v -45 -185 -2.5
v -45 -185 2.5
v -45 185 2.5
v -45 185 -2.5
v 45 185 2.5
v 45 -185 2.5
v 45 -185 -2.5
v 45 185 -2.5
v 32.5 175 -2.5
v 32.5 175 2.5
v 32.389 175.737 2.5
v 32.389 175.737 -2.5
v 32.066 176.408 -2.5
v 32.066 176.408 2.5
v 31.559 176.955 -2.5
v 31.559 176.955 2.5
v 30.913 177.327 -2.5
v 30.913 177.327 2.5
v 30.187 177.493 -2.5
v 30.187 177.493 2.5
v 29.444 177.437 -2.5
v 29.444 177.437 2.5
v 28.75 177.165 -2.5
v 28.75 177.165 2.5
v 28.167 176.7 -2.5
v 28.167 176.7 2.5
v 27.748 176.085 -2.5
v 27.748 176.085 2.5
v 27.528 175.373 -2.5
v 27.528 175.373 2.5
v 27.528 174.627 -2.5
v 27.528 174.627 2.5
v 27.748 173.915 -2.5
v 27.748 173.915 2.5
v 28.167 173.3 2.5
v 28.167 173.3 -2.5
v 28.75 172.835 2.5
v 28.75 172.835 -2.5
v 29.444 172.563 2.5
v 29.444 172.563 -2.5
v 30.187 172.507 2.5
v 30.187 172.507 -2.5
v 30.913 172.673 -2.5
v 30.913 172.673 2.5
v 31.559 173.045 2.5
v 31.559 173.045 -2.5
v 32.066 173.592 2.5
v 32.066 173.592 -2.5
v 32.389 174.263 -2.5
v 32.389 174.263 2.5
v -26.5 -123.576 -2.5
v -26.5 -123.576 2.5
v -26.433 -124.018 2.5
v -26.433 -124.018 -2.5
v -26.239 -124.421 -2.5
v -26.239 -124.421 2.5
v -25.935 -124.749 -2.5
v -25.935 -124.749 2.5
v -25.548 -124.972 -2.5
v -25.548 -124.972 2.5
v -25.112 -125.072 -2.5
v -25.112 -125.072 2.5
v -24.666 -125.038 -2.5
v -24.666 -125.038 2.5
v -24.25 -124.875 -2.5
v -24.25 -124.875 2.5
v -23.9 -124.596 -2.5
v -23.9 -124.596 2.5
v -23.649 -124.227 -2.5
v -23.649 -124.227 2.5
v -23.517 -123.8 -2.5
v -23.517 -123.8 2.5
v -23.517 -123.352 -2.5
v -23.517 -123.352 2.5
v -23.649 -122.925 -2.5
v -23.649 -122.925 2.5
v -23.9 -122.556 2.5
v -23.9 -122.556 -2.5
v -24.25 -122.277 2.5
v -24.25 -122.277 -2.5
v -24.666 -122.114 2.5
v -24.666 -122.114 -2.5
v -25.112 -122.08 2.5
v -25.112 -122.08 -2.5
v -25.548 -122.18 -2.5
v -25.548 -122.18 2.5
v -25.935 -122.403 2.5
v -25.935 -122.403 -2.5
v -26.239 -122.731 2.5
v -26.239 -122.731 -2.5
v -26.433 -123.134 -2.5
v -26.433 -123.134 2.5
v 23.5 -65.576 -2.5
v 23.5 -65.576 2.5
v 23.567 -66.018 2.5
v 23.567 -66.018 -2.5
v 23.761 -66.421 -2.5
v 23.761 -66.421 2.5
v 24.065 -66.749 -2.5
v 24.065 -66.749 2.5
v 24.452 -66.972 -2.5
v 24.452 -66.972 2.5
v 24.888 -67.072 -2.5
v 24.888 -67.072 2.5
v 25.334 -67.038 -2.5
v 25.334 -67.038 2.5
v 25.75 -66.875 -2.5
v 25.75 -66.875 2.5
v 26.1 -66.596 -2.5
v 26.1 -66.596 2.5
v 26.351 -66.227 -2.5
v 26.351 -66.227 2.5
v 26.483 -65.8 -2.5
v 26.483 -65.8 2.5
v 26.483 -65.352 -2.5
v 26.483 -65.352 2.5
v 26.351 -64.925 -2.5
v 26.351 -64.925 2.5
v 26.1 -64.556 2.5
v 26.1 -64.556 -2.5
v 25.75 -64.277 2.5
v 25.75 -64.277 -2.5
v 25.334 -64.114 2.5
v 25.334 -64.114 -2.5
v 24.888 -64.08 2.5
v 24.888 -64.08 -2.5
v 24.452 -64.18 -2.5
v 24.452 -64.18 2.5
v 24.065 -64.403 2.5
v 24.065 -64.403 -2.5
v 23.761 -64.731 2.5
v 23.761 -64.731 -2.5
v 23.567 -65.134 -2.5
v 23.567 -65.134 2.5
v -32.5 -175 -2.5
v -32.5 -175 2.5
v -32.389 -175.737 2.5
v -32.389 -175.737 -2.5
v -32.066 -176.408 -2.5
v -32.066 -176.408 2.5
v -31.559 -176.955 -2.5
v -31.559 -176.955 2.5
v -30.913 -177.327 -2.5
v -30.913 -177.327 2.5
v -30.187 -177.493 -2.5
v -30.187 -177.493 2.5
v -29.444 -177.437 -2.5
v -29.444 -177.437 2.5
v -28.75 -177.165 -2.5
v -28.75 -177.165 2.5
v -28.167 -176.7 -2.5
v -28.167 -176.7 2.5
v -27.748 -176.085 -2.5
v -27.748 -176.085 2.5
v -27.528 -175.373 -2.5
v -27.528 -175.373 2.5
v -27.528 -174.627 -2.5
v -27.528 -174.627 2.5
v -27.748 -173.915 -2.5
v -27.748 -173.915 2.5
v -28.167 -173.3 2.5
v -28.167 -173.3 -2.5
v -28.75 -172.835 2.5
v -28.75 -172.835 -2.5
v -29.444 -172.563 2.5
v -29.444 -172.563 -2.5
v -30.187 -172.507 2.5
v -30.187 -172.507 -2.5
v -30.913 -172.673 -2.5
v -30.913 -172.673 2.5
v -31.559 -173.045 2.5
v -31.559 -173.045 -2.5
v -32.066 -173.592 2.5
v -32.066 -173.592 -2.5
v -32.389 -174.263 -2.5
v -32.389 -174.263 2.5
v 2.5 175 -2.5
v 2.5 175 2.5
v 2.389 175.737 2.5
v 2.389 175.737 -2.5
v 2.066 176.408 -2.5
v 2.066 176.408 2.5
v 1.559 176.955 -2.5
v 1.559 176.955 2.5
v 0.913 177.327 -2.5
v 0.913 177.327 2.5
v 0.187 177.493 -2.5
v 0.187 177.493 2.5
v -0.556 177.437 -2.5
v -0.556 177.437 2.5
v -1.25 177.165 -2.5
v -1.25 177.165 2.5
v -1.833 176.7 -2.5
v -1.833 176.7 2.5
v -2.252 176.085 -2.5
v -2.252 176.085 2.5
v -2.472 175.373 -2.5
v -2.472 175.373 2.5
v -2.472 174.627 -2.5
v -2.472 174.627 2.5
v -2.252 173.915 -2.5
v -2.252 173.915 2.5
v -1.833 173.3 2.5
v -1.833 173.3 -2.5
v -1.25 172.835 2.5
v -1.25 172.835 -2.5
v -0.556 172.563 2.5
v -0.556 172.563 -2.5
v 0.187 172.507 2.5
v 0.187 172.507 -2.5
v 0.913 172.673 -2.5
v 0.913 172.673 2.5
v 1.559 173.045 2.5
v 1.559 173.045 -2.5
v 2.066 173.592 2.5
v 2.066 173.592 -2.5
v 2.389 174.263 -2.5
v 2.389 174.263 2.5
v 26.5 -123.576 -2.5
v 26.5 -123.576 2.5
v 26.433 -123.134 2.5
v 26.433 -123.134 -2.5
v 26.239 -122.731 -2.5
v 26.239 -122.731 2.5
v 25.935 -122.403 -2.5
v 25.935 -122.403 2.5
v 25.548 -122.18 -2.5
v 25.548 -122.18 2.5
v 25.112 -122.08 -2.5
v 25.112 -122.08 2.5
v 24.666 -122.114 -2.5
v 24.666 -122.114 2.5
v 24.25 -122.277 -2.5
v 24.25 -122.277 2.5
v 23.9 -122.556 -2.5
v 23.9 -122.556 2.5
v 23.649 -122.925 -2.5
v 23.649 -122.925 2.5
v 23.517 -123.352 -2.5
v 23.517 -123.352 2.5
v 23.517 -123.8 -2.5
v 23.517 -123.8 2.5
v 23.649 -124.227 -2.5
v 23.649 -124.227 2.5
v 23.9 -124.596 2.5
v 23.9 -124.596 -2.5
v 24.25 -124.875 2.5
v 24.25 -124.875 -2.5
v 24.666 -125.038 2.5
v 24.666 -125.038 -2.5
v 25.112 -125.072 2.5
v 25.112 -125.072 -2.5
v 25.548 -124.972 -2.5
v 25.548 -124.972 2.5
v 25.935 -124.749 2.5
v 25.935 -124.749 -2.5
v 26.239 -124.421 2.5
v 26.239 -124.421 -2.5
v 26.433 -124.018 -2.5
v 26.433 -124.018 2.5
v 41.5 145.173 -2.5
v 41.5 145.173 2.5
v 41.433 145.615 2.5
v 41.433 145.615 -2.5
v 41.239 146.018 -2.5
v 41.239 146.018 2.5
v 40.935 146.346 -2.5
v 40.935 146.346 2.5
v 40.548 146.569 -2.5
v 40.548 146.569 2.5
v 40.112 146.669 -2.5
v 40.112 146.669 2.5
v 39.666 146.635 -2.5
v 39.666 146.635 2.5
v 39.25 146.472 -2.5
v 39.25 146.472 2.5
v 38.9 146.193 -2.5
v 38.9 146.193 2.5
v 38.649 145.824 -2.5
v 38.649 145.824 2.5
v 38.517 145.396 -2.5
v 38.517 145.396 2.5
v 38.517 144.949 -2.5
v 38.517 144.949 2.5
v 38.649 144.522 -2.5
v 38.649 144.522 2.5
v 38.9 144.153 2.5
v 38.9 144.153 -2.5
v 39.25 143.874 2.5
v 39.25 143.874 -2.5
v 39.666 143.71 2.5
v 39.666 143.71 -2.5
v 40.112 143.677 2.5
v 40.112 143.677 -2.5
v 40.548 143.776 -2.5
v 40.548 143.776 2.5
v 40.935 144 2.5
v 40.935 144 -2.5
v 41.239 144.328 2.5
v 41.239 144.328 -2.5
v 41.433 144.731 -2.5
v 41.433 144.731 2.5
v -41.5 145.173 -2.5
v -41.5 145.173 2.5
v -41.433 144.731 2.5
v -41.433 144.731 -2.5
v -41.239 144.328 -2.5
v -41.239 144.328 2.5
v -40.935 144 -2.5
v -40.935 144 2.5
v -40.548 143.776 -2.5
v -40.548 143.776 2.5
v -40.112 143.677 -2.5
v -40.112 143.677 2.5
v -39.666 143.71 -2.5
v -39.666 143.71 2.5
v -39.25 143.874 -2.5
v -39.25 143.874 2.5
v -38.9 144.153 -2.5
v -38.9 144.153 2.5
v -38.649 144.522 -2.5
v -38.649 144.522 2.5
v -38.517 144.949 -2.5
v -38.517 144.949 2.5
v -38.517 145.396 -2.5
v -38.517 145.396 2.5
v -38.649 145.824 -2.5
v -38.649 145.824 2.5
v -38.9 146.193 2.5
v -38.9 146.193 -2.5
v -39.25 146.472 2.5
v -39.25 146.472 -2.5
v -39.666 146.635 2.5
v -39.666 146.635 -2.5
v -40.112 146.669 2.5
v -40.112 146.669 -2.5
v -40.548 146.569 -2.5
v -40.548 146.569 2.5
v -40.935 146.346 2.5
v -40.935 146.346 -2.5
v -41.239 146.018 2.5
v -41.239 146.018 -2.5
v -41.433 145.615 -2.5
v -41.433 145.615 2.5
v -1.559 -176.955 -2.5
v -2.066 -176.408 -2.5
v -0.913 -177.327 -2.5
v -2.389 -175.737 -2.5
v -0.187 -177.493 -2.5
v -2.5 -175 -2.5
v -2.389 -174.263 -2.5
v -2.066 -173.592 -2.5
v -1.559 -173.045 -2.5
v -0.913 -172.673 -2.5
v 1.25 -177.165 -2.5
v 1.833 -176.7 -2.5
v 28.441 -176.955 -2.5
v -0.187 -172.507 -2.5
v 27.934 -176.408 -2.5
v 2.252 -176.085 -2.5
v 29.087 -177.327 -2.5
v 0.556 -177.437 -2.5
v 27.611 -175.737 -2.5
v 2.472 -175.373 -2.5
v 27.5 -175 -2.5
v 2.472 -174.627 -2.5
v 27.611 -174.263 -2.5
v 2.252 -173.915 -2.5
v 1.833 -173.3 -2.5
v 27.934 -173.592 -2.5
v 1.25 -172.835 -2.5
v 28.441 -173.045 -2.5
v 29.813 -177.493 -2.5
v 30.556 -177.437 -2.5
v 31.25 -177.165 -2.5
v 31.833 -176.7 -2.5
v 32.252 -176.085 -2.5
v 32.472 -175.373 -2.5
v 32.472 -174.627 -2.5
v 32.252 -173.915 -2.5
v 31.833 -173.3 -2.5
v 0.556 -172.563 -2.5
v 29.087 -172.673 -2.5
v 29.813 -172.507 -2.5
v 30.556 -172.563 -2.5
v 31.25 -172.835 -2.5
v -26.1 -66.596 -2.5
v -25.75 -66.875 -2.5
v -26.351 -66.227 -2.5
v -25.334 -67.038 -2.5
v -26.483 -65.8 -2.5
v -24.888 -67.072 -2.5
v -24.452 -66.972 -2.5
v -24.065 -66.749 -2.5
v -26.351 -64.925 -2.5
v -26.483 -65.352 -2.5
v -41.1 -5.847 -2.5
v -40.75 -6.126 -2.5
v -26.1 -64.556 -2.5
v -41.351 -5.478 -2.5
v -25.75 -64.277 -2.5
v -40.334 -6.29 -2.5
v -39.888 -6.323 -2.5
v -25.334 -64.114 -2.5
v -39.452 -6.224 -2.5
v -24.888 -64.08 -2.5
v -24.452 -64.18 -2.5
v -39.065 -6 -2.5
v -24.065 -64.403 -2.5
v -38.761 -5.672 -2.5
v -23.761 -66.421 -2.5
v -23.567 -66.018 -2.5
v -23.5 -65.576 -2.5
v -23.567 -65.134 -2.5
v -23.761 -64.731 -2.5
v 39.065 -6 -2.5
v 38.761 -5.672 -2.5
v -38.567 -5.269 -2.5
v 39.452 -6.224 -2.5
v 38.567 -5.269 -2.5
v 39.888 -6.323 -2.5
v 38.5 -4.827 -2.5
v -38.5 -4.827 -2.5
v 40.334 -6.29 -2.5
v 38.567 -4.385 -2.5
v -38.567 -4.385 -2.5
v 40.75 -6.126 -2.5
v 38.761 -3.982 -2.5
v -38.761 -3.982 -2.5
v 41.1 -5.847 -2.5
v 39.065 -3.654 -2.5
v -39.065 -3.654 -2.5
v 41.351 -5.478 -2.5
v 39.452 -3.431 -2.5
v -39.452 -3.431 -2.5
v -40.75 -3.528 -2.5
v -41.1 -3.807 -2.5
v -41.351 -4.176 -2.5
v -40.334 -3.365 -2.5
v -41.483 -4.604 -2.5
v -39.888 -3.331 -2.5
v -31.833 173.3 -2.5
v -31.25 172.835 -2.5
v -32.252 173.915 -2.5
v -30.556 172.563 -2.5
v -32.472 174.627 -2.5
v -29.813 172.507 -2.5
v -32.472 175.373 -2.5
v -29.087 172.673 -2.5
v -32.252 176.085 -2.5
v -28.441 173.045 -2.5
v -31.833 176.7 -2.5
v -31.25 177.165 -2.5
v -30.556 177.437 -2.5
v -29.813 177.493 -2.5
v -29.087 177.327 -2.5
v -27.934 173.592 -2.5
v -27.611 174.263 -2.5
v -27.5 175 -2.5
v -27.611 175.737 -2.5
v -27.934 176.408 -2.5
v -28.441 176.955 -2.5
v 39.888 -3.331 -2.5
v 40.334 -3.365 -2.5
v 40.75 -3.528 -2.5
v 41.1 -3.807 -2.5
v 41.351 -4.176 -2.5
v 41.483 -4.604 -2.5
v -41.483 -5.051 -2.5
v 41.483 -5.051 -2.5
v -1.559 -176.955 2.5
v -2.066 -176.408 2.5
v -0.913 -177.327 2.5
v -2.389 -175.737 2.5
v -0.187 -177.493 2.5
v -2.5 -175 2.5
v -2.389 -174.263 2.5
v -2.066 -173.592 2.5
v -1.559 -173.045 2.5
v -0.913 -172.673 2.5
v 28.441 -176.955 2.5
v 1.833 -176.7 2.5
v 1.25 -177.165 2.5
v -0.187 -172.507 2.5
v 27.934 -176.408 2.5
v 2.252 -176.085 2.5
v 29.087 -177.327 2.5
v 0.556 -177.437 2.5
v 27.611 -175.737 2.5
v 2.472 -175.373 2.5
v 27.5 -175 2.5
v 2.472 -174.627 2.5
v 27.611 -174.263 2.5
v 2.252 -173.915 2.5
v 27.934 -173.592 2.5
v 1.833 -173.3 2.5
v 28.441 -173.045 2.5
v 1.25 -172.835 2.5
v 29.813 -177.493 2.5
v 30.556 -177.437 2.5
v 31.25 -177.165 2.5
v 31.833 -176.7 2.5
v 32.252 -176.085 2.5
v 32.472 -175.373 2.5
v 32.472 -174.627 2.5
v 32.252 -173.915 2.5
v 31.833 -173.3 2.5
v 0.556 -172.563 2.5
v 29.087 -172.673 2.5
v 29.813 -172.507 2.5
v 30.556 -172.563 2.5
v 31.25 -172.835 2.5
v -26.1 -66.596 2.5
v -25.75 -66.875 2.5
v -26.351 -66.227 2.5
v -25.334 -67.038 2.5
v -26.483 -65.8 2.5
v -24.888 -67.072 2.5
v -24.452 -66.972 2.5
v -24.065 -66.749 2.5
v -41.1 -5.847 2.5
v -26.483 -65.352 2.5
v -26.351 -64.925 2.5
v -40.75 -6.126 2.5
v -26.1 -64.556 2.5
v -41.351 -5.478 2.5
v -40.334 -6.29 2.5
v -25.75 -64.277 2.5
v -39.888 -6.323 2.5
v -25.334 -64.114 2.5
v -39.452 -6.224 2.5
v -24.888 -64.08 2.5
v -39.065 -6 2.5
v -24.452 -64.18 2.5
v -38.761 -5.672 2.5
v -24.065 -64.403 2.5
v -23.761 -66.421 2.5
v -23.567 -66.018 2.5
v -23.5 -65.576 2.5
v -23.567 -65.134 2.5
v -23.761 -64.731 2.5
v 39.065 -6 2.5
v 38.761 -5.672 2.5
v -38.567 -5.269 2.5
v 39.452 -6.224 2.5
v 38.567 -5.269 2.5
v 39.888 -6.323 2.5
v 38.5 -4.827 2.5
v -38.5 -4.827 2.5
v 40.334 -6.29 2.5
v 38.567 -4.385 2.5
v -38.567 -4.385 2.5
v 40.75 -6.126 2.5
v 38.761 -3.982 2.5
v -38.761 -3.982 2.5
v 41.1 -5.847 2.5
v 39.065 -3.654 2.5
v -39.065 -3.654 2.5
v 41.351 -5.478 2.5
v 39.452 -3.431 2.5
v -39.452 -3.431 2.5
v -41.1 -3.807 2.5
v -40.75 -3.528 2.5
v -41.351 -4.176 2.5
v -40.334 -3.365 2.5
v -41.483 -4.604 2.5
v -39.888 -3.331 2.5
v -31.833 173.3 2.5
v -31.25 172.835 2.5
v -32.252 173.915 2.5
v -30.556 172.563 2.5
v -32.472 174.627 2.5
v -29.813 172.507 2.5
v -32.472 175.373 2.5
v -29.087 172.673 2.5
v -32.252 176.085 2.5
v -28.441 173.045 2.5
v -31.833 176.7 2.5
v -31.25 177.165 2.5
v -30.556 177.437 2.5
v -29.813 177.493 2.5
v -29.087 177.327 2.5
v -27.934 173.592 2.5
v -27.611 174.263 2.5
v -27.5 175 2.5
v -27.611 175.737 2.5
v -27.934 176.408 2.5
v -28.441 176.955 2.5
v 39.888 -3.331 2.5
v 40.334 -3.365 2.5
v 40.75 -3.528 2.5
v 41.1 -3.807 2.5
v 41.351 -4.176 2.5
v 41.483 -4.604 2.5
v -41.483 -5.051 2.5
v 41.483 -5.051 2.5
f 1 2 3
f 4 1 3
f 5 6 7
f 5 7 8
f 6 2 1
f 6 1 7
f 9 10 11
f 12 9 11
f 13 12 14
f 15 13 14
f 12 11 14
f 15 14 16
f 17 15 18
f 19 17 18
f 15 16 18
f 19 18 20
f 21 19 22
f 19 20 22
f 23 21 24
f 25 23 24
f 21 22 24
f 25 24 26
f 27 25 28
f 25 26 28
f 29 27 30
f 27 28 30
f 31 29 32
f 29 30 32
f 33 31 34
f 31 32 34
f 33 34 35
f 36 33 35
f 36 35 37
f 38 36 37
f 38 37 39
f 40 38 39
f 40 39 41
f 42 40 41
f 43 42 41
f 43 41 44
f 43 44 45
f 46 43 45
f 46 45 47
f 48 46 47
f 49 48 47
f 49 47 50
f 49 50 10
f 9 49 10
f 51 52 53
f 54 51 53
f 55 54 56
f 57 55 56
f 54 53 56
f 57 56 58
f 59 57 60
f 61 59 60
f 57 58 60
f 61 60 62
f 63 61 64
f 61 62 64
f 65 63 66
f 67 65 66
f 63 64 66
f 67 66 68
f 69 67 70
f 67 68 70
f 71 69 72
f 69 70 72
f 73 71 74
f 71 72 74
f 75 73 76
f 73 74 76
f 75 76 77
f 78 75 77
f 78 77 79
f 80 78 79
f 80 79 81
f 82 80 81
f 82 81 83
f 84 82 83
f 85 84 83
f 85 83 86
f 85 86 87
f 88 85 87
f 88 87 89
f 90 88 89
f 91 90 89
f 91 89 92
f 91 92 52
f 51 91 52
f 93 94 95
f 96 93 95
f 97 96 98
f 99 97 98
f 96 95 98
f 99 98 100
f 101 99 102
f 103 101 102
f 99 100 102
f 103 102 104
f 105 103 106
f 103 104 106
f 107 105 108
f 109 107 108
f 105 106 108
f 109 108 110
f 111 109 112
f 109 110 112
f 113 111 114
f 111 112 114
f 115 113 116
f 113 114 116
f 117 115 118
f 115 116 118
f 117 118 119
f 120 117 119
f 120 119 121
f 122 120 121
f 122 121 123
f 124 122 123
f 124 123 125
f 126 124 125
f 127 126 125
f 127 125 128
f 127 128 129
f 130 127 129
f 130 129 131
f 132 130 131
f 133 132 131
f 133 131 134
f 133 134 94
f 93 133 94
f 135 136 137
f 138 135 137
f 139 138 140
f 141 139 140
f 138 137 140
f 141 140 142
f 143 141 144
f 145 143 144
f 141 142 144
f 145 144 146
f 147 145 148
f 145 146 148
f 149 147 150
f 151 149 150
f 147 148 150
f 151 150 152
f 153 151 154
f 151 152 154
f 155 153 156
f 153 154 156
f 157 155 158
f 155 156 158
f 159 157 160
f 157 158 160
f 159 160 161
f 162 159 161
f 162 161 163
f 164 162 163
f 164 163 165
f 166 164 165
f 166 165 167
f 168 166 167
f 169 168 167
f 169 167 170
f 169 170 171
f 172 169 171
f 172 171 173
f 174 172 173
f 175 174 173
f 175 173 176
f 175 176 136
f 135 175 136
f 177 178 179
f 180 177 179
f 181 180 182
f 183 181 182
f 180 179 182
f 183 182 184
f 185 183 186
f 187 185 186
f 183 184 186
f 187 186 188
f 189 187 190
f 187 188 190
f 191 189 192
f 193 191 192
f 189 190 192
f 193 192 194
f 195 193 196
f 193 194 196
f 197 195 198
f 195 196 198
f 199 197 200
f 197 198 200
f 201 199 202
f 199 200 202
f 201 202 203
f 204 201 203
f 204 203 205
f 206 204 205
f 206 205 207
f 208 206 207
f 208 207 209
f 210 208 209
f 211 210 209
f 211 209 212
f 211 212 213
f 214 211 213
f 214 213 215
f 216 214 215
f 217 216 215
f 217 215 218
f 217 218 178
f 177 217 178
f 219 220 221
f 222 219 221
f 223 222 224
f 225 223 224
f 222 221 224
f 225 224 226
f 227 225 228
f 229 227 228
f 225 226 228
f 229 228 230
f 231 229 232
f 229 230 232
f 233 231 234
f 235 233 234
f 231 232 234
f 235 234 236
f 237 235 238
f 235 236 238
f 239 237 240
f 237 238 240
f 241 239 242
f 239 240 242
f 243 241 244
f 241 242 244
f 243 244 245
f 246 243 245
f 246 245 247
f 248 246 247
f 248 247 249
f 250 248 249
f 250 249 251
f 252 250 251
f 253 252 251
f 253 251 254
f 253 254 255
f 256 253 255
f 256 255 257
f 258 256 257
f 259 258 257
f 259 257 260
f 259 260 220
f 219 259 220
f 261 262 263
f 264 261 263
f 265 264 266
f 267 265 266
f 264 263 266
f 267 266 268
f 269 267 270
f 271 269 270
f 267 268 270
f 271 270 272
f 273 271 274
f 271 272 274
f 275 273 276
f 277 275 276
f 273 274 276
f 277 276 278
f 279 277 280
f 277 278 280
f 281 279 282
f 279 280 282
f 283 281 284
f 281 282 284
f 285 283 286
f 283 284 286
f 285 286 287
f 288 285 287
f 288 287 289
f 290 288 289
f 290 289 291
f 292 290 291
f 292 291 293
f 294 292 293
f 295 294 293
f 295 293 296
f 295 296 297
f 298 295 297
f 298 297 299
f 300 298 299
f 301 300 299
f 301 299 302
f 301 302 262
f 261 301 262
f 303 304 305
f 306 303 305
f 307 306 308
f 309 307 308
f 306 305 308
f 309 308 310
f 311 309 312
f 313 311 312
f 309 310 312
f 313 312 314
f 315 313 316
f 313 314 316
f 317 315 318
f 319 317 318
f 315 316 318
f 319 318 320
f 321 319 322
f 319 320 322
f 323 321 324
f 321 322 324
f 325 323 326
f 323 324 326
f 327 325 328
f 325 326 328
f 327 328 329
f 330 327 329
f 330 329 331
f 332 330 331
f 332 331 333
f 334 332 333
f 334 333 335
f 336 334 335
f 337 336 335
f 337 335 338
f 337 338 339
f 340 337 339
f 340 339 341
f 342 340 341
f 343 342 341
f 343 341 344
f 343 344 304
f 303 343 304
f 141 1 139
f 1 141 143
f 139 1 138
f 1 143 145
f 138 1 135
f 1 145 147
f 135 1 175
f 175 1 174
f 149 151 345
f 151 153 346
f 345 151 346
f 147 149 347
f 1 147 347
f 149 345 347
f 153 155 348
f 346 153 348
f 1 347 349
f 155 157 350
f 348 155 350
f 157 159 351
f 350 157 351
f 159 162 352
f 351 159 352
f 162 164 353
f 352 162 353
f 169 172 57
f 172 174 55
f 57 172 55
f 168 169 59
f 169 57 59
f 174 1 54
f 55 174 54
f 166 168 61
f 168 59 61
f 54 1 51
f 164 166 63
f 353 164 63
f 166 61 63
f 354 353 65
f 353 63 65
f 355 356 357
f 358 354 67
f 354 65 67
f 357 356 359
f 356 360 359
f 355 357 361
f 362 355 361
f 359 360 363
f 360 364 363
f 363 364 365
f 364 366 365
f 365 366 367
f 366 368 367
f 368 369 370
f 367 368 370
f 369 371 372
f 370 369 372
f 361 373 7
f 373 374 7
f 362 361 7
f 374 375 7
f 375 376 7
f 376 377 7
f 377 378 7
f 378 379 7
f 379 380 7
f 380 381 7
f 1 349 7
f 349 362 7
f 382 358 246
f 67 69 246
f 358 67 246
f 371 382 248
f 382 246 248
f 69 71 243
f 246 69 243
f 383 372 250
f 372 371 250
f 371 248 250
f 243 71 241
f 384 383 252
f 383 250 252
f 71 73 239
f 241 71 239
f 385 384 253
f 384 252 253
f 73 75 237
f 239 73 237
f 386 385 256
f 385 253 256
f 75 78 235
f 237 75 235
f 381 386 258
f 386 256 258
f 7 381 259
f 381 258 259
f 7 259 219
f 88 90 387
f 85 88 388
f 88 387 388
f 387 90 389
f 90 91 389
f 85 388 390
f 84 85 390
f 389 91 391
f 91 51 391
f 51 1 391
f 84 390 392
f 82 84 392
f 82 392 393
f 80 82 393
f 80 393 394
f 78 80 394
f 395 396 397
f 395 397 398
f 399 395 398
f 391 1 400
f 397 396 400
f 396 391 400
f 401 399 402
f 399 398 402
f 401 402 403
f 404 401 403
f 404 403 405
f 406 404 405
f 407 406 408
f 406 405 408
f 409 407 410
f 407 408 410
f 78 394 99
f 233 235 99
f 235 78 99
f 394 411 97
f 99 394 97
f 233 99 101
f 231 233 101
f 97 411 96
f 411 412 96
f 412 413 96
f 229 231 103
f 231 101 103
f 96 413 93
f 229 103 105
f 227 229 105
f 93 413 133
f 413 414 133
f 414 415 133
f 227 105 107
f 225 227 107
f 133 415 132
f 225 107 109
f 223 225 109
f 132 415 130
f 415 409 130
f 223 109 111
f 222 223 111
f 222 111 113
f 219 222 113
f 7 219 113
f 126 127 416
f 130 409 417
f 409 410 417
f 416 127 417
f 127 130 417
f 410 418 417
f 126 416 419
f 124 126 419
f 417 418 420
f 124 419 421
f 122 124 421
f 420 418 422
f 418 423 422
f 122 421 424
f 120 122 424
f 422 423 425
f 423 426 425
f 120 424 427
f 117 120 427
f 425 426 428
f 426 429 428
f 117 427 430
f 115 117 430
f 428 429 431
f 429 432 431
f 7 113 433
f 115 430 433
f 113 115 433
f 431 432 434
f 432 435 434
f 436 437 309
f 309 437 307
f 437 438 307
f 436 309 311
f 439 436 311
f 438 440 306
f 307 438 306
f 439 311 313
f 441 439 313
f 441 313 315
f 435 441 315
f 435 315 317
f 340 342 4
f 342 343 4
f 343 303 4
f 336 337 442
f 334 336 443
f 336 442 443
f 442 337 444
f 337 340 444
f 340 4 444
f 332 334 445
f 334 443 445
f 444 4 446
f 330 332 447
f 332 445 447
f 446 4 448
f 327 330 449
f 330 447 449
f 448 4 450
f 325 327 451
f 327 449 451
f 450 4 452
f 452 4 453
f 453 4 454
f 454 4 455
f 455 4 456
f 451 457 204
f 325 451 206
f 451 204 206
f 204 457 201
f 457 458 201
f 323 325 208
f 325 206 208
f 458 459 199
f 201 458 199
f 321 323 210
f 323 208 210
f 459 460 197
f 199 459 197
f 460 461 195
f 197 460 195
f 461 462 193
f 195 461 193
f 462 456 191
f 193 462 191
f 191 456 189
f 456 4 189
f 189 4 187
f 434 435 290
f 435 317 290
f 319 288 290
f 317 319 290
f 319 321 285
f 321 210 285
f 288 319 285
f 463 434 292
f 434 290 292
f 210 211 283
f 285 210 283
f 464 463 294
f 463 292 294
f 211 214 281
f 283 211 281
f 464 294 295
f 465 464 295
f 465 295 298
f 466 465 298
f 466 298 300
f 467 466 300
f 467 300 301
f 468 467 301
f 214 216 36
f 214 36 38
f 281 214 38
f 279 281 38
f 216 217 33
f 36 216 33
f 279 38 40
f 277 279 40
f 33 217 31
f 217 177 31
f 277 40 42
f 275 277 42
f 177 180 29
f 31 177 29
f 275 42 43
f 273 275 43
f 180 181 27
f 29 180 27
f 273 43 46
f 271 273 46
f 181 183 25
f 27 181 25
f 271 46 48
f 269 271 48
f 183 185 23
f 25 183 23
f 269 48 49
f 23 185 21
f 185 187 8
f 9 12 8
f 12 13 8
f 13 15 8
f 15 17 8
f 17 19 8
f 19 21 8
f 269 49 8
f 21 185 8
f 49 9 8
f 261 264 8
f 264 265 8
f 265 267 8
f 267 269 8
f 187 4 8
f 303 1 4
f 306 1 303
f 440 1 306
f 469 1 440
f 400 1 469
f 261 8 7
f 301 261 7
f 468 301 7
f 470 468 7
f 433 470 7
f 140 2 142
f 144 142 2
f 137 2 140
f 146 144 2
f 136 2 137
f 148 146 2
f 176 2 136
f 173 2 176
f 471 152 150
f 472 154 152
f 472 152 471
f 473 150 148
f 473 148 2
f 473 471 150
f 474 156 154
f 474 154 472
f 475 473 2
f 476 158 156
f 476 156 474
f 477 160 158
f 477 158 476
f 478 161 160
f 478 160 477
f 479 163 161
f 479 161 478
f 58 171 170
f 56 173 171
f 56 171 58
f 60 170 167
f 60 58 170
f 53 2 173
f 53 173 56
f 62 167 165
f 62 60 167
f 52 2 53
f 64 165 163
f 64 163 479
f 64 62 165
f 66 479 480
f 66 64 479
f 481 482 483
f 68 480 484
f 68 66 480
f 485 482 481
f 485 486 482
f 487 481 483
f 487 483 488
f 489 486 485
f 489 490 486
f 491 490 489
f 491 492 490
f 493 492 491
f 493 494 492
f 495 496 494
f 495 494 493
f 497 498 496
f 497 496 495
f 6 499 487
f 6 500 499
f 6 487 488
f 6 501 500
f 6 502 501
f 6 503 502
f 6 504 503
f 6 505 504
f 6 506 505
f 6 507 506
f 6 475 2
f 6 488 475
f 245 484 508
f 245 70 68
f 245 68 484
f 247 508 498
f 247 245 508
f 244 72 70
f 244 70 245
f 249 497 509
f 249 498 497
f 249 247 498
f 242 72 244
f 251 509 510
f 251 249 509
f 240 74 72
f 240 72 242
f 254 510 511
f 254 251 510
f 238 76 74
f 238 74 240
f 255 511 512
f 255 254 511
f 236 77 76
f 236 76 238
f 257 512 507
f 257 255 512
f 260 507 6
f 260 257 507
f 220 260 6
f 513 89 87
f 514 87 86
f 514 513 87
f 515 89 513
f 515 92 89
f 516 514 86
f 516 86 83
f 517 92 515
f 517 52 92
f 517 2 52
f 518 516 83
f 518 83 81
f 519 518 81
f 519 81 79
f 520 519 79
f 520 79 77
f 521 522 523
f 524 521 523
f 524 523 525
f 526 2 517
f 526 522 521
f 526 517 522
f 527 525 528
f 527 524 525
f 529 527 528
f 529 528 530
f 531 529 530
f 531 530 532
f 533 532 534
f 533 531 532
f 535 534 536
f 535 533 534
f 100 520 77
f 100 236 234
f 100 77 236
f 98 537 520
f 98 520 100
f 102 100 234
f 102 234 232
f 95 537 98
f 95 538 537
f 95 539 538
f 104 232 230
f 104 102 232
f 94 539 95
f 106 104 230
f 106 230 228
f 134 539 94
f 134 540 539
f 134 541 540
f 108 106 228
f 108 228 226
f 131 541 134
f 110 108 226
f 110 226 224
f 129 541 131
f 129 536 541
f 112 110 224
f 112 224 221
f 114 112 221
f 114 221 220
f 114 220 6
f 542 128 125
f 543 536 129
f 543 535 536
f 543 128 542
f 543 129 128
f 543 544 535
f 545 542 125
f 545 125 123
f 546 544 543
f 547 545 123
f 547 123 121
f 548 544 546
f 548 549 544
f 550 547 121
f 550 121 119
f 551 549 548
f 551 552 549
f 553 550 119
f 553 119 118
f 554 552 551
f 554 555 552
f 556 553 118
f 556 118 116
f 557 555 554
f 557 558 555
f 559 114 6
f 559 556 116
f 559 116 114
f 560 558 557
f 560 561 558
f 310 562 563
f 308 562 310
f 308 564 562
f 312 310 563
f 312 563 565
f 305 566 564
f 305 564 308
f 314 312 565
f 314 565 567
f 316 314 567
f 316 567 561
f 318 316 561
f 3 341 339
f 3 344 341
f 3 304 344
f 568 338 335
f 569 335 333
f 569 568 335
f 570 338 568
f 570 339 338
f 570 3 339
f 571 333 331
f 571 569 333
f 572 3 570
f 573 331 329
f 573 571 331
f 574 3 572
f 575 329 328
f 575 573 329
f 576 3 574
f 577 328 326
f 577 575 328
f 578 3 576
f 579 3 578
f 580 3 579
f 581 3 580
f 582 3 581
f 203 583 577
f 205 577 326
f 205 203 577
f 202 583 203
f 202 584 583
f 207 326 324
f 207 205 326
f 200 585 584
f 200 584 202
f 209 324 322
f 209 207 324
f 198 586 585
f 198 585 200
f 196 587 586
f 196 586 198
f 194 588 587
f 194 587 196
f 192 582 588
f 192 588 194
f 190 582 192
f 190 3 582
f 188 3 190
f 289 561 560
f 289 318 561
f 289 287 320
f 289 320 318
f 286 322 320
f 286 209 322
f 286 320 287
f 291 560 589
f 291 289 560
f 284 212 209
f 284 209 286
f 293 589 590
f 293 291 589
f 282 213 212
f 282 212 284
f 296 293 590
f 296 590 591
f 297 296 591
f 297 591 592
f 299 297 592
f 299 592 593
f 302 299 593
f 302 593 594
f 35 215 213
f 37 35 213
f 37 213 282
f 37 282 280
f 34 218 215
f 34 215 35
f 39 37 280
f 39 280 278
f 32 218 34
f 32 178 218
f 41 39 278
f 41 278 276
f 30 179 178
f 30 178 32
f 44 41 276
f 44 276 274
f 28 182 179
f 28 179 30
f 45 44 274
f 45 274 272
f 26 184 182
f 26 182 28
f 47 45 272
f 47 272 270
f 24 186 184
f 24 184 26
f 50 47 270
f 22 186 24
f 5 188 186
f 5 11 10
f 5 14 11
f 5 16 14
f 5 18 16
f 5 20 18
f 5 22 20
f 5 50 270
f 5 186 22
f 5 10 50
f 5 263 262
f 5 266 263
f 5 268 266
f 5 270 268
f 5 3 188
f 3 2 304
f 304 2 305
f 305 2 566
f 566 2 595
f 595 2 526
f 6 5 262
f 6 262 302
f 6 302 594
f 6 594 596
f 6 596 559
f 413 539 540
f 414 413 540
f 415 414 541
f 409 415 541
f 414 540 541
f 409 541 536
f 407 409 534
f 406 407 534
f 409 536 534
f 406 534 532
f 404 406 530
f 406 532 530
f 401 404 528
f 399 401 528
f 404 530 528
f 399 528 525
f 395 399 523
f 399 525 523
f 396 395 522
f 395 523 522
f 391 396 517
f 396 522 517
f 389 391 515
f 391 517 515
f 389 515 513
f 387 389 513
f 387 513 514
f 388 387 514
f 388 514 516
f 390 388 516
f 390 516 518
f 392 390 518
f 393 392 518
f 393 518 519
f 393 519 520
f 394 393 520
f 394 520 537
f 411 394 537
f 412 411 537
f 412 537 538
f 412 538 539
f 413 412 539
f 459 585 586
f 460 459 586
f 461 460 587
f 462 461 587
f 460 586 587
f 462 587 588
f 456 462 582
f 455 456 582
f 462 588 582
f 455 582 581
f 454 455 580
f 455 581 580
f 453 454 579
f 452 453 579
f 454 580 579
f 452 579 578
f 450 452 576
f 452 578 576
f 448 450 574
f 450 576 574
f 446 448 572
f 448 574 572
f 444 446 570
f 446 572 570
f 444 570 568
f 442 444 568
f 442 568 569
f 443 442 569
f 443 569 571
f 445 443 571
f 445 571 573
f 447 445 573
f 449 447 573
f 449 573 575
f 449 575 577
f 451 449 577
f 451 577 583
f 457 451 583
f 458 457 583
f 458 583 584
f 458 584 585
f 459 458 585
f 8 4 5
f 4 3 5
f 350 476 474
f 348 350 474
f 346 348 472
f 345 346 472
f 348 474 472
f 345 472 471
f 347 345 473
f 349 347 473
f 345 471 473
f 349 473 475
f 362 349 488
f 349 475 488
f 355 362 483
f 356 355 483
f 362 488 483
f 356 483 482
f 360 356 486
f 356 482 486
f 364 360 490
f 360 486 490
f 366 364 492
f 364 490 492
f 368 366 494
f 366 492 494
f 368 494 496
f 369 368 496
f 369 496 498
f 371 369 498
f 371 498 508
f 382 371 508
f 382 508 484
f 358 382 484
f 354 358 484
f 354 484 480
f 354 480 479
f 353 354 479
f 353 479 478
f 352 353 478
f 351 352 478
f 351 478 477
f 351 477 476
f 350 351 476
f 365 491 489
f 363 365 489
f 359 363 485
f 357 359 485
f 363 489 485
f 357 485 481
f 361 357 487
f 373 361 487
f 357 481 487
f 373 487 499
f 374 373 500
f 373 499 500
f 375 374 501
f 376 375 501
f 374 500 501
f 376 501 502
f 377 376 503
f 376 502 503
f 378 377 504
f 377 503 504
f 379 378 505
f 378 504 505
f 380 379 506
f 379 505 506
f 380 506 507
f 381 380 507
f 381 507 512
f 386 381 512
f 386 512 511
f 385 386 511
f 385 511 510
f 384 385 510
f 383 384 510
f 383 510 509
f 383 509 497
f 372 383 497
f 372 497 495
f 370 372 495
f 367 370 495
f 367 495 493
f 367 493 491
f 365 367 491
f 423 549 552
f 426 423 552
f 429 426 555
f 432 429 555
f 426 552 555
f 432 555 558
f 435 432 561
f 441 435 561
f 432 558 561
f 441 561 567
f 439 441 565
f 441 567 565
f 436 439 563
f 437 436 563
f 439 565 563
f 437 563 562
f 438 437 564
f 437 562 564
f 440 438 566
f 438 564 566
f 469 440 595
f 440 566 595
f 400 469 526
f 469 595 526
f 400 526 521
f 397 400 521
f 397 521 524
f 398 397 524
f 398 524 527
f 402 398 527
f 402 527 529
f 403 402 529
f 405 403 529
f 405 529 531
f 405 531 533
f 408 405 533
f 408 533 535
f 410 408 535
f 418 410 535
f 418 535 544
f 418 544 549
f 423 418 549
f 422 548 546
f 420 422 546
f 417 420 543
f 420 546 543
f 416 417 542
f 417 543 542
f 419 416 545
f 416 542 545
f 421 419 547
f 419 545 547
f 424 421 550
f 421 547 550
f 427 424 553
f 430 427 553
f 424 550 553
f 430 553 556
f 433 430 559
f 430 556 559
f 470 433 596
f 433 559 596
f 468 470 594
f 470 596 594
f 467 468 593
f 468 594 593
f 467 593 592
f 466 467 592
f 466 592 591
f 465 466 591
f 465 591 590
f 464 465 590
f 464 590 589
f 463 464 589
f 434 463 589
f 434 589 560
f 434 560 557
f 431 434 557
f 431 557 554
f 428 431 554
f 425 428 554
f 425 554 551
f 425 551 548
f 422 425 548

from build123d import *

# Parameters (mm, degrees)
SKETCH_2_W          = 90
SKETCH_2_H          = 370
EXTRUDE_1_DEPTH     = 2.5
SKETCH_3_R          = 2.5
CUT_EXTRUDE_1_DEPTH = 191.459969547
SKETCH_5_R          = 1.5
CUT_EXTRUDE_3_DEPTH = 191.459969547
SKETCH_6_R          = 1.5
CUT_EXTRUDE_4_DEPTH = 191.459969547


with BuildPart() as part:
    # 草图2 → 凸台-拉伸1 (new, symmetric)
    with BuildSketch(Plane.XY):
        Rectangle(SKETCH_2_W, SKETCH_2_H)
    extrude(amount=EXTRUDE_1_DEPTH, both=True)

    # 草图3 → 切除-拉伸1 (cut, through all)
    with BuildSketch(Plane.XY.offset(2.5)):
        with Locations((0, 175)):
            Circle(SKETCH_3_R)
        with Locations((30, 175)):
            Circle(SKETCH_3_R)
        with Locations((-30, 175)):
            Circle(SKETCH_3_R)
        with Locations(Location((-30, -175, 0), (0, 0, 180))):
            Circle(SKETCH_3_R)
        with Locations(Location((30, -175, 0), (0, 0, 180))):
            Circle(SKETCH_3_R)
        with Locations(Location((0, -175, 0), (0, 0, 180))):
            Circle(SKETCH_3_R)
    extrude(amount=-CUT_EXTRUDE_1_DEPTH, mode=Mode.SUBTRACT)

    # 草图5 → 切除-拉伸3 (cut, through all)
    with BuildSketch(Plane.XY.offset(2.5)):
        with Locations((40, 145.172802193)):
            Circle(SKETCH_5_R)
        with Locations(Location((-40, 145.172802193, 0), (0, 0, 180))):
            Circle(SKETCH_5_R)
        with Locations((-40, -4.827197807)):
            Circle(SKETCH_5_R)
        with Locations(Location((40, -4.827197807, 0), (0, 0, 180))):
            Circle(SKETCH_5_R)
    extrude(amount=-CUT_EXTRUDE_3_DEPTH, mode=Mode.SUBTRACT)

    # 草图6 → 切除-拉伸4 (cut, through all)
    with BuildSketch(Plane.XY.offset(2.5)):
        with Locations((25, -123.576005542)):
            Circle(SKETCH_6_R)
        with Locations(Location((-25, -123.576005542, 0), (0, 0, 180))):
            Circle(SKETCH_6_R)
        with Locations(Location((25, -65.576005542, 0), (0, 0, 180))):
            Circle(SKETCH_6_R)
        with Locations((-25, -65.576005542)):
            Circle(SKETCH_6_R)
    extrude(amount=-CUT_EXTRUDE_4_DEPTH, mode=Mode.SUBTRACT)


solid = part.part
